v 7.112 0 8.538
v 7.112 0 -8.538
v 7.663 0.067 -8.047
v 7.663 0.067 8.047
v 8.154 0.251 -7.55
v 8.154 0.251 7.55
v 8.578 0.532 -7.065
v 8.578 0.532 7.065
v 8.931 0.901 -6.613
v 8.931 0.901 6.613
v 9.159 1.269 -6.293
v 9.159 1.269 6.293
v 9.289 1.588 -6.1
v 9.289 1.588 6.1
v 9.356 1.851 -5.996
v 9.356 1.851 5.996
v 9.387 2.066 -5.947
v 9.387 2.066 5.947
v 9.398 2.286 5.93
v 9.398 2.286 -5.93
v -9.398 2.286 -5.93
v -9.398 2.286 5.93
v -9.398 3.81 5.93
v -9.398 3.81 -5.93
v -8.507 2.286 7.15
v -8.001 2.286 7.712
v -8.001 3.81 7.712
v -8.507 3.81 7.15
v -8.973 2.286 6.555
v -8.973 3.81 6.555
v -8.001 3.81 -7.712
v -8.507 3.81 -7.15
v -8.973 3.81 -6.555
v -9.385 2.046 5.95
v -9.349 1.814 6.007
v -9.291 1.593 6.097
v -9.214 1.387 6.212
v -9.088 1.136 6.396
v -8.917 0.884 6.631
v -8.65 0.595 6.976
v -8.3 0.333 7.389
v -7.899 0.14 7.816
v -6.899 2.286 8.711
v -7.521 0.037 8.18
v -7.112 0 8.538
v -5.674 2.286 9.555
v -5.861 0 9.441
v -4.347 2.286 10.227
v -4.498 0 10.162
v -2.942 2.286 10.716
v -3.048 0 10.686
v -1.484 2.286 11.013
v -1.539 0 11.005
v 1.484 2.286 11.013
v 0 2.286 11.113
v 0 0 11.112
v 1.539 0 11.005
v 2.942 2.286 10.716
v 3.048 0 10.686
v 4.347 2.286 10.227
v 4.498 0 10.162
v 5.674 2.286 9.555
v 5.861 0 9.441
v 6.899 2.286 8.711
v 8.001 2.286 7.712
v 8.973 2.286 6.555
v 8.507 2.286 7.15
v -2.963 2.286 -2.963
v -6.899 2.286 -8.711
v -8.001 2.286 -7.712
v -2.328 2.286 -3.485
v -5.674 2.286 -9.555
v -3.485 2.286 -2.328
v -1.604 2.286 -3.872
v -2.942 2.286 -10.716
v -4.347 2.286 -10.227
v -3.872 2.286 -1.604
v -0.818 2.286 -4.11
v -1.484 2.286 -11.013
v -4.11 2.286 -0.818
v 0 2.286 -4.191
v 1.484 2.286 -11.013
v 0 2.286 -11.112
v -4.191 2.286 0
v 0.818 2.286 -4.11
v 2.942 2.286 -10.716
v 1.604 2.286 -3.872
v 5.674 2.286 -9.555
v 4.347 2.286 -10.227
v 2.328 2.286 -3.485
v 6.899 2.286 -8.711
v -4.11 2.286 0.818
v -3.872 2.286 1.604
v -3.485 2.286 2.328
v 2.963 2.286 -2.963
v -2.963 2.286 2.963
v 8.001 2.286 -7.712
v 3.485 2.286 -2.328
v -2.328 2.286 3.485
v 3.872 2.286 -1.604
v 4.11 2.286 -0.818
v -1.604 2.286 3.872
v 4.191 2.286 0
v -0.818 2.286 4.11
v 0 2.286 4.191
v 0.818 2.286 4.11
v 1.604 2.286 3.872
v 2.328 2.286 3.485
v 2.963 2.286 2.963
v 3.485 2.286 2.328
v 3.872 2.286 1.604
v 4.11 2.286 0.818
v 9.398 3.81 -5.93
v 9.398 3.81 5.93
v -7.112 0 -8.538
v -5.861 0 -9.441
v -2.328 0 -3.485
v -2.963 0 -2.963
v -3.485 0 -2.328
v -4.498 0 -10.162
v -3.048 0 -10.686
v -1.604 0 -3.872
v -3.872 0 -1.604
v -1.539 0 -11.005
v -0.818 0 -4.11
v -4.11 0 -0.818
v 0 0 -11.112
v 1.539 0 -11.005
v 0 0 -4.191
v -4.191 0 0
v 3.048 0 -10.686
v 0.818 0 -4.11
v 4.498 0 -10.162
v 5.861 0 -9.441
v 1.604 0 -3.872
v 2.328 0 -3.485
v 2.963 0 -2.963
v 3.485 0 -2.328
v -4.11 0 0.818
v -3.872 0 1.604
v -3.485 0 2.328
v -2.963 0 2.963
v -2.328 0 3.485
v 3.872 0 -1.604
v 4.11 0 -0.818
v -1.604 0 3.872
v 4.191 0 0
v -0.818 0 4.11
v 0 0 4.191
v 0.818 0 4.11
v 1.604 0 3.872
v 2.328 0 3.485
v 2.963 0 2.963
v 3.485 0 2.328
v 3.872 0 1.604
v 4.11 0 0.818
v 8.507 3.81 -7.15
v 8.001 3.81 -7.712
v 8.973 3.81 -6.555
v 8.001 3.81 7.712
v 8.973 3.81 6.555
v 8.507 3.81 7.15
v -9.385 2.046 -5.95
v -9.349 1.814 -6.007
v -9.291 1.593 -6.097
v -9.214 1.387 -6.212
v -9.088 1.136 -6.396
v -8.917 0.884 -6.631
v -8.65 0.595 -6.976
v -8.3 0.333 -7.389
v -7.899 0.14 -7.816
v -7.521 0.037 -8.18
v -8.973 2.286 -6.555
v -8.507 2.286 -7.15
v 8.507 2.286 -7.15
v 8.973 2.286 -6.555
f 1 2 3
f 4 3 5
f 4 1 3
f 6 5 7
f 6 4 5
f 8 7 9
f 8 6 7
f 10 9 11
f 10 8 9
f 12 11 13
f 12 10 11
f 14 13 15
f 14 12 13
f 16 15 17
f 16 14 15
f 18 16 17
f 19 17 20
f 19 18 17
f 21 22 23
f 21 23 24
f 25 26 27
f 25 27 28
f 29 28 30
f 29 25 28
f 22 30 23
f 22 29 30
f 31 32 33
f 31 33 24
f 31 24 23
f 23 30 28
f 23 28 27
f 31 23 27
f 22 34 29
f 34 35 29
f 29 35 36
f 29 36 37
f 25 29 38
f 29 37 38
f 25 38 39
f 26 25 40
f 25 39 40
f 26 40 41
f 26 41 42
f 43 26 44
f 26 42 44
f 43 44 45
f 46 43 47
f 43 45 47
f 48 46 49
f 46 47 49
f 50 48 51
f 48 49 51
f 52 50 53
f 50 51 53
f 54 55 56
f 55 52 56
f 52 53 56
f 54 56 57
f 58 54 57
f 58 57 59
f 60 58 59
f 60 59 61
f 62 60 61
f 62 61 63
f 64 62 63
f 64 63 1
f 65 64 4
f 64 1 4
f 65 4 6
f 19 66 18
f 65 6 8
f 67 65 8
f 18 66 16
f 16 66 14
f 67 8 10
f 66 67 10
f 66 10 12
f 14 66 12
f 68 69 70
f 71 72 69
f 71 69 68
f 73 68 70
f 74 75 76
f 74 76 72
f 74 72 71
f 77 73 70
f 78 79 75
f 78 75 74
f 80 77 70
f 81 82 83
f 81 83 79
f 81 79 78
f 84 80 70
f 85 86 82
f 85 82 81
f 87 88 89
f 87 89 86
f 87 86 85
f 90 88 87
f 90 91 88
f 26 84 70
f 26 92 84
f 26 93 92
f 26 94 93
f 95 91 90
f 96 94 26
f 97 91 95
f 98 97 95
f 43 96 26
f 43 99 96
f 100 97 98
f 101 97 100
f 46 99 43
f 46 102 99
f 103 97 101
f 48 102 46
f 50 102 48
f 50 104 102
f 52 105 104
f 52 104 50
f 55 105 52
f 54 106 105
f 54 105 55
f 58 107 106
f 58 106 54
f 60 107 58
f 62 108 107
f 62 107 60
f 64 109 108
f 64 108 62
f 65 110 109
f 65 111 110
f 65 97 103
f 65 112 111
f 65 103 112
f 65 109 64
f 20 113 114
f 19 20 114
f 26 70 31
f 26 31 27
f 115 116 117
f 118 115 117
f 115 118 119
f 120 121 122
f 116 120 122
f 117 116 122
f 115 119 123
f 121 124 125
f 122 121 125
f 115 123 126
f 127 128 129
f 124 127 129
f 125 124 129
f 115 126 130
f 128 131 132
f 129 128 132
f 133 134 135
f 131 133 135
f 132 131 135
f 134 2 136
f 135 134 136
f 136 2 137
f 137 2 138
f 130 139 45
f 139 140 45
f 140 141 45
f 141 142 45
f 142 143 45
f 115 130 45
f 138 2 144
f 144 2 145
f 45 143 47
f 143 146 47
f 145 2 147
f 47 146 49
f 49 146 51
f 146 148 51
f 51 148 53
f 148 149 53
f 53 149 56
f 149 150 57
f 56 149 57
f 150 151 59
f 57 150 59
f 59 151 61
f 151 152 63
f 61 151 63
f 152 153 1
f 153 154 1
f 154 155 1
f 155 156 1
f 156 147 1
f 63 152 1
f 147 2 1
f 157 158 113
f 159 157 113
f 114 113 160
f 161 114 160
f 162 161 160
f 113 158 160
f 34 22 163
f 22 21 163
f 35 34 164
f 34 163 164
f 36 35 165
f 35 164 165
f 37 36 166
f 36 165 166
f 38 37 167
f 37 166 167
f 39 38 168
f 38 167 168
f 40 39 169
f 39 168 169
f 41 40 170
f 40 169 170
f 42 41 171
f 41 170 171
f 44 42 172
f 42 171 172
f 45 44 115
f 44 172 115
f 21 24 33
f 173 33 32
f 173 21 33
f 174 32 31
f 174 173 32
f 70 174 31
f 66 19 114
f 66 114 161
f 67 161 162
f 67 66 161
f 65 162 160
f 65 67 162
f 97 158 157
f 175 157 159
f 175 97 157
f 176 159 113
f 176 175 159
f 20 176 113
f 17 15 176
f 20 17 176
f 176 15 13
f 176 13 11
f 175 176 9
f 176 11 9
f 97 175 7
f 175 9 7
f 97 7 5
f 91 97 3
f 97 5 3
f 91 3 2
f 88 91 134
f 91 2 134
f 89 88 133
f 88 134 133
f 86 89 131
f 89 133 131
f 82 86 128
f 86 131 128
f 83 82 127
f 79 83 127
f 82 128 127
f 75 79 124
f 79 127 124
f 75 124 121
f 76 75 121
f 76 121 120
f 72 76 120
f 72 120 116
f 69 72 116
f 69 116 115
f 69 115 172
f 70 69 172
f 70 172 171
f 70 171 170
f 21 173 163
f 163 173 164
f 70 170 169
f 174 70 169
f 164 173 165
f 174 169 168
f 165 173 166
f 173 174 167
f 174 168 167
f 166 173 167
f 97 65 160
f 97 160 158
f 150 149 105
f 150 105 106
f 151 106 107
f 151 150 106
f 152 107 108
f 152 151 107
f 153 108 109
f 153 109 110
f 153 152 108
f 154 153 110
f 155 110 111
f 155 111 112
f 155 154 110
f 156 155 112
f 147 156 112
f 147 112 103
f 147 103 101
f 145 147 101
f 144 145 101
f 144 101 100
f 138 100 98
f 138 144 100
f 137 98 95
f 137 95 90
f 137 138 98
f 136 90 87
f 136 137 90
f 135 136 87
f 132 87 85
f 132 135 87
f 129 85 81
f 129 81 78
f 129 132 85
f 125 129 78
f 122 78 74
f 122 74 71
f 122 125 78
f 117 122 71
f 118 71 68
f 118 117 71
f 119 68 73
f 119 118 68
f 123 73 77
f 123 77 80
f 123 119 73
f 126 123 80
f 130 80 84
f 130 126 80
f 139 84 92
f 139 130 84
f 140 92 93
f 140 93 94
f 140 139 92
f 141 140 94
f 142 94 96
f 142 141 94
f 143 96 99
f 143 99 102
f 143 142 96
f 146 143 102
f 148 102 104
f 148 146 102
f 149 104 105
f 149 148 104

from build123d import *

# Parameters (mm, degrees)
SKETCH1_R           = 11.1125
SKETCH1_R_2         = 4.191
BASE_EXTRUDE_DEPTH  = 2.286
CUT_EXTRUDE1_DEPTH  = 16.880840925
BOSS_EXTRUDE1_DEPTH = 1.524
FILLET1_R           = 2.286


with BuildPart() as part:
    # Sketch1 → Base-Extrude (new body)
    with BuildSketch(Plane(origin=(0, 0, 0), x_dir=(-1, 0, 0), z_dir=(0, 1, 0))):
        with Locations(Location((0, 0, 0), (0, 0, 90))):
            Circle(SKETCH1_R)
        with Locations(Location((0, 0, 0), (0, 0, 90))):
            Circle(SKETCH1_R_2, mode=Mode.SUBTRACT)
    extrude(amount=BASE_EXTRUDE_DEPTH)

    # Sketch2 → Cut-Extrude1 (cut, through all)
    with BuildSketch(Plane(origin=(0, 2.286, 0), x_dir=(-1, 0, 0), z_dir=(0, 1, 0))):
        with BuildLine():
            Line((9.398, 5.930029701), (9.398, -5.930029701))
            ThreePointArc((9.398, -5.930029701), (11.1125, 0), (9.398, 5.930029701))
        make_face()
        with BuildLine():
            ThreePointArc((-9.398, 5.930029701), (-11.1125, 0), (-9.398, -5.930029701))
            Line((-9.398, -5.930029701), (-9.398, 5.930029701))
        make_face()
    extrude(amount=-CUT_EXTRUDE1_DEPTH, mode=Mode.SUBTRACT)

    # Sketch3 → Boss-Extrude1 (add)
    with BuildSketch(Plane(origin=(0, 2.286, 0), x_dir=(-1, 0, 0), z_dir=(0, 1, 0))):
        with BuildLine():
            Line((8.001, -7.711786774), (8.001, 7.711786774))
            ThreePointArc((8.001, 7.711786774), (8.744996559, 6.856580156), (9.398, 5.930029701))
            Line((9.398, 5.930029701), (9.398, -5.930029701))
            ThreePointArc((9.398, -5.930029701), (8.744996559, -6.856580156), (8.001, -7.711786774))
        make_face()
        with BuildLine():
            Line((-8.001, 7.711786774), (-8.001, -7.711786774))
            ThreePointArc((-8.001, -7.711786774), (-8.744996559, -6.856580156), (-9.398, -5.930029701))
            Line((-9.398, -5.930029701), (-9.398, 5.930029701))
            ThreePointArc((-9.398, 5.930029701), (-8.744996559, 6.856580156), (-8.001, 7.711786774))
        make_face()
    extrude(amount=BOSS_EXTRUDE1_DEPTH)

    # Fillet1
    fillet1_edges = [part.edges().sort_by_distance(p)[0] for p in [
        (9.398, 0, 0),
        (-9.398, 0, 0),
    ]]
    fillet(fillet1_edges, radius=FILLET1_R - 0.0001)  # a hair under: the kernel refuses the full size


solid = part.part
